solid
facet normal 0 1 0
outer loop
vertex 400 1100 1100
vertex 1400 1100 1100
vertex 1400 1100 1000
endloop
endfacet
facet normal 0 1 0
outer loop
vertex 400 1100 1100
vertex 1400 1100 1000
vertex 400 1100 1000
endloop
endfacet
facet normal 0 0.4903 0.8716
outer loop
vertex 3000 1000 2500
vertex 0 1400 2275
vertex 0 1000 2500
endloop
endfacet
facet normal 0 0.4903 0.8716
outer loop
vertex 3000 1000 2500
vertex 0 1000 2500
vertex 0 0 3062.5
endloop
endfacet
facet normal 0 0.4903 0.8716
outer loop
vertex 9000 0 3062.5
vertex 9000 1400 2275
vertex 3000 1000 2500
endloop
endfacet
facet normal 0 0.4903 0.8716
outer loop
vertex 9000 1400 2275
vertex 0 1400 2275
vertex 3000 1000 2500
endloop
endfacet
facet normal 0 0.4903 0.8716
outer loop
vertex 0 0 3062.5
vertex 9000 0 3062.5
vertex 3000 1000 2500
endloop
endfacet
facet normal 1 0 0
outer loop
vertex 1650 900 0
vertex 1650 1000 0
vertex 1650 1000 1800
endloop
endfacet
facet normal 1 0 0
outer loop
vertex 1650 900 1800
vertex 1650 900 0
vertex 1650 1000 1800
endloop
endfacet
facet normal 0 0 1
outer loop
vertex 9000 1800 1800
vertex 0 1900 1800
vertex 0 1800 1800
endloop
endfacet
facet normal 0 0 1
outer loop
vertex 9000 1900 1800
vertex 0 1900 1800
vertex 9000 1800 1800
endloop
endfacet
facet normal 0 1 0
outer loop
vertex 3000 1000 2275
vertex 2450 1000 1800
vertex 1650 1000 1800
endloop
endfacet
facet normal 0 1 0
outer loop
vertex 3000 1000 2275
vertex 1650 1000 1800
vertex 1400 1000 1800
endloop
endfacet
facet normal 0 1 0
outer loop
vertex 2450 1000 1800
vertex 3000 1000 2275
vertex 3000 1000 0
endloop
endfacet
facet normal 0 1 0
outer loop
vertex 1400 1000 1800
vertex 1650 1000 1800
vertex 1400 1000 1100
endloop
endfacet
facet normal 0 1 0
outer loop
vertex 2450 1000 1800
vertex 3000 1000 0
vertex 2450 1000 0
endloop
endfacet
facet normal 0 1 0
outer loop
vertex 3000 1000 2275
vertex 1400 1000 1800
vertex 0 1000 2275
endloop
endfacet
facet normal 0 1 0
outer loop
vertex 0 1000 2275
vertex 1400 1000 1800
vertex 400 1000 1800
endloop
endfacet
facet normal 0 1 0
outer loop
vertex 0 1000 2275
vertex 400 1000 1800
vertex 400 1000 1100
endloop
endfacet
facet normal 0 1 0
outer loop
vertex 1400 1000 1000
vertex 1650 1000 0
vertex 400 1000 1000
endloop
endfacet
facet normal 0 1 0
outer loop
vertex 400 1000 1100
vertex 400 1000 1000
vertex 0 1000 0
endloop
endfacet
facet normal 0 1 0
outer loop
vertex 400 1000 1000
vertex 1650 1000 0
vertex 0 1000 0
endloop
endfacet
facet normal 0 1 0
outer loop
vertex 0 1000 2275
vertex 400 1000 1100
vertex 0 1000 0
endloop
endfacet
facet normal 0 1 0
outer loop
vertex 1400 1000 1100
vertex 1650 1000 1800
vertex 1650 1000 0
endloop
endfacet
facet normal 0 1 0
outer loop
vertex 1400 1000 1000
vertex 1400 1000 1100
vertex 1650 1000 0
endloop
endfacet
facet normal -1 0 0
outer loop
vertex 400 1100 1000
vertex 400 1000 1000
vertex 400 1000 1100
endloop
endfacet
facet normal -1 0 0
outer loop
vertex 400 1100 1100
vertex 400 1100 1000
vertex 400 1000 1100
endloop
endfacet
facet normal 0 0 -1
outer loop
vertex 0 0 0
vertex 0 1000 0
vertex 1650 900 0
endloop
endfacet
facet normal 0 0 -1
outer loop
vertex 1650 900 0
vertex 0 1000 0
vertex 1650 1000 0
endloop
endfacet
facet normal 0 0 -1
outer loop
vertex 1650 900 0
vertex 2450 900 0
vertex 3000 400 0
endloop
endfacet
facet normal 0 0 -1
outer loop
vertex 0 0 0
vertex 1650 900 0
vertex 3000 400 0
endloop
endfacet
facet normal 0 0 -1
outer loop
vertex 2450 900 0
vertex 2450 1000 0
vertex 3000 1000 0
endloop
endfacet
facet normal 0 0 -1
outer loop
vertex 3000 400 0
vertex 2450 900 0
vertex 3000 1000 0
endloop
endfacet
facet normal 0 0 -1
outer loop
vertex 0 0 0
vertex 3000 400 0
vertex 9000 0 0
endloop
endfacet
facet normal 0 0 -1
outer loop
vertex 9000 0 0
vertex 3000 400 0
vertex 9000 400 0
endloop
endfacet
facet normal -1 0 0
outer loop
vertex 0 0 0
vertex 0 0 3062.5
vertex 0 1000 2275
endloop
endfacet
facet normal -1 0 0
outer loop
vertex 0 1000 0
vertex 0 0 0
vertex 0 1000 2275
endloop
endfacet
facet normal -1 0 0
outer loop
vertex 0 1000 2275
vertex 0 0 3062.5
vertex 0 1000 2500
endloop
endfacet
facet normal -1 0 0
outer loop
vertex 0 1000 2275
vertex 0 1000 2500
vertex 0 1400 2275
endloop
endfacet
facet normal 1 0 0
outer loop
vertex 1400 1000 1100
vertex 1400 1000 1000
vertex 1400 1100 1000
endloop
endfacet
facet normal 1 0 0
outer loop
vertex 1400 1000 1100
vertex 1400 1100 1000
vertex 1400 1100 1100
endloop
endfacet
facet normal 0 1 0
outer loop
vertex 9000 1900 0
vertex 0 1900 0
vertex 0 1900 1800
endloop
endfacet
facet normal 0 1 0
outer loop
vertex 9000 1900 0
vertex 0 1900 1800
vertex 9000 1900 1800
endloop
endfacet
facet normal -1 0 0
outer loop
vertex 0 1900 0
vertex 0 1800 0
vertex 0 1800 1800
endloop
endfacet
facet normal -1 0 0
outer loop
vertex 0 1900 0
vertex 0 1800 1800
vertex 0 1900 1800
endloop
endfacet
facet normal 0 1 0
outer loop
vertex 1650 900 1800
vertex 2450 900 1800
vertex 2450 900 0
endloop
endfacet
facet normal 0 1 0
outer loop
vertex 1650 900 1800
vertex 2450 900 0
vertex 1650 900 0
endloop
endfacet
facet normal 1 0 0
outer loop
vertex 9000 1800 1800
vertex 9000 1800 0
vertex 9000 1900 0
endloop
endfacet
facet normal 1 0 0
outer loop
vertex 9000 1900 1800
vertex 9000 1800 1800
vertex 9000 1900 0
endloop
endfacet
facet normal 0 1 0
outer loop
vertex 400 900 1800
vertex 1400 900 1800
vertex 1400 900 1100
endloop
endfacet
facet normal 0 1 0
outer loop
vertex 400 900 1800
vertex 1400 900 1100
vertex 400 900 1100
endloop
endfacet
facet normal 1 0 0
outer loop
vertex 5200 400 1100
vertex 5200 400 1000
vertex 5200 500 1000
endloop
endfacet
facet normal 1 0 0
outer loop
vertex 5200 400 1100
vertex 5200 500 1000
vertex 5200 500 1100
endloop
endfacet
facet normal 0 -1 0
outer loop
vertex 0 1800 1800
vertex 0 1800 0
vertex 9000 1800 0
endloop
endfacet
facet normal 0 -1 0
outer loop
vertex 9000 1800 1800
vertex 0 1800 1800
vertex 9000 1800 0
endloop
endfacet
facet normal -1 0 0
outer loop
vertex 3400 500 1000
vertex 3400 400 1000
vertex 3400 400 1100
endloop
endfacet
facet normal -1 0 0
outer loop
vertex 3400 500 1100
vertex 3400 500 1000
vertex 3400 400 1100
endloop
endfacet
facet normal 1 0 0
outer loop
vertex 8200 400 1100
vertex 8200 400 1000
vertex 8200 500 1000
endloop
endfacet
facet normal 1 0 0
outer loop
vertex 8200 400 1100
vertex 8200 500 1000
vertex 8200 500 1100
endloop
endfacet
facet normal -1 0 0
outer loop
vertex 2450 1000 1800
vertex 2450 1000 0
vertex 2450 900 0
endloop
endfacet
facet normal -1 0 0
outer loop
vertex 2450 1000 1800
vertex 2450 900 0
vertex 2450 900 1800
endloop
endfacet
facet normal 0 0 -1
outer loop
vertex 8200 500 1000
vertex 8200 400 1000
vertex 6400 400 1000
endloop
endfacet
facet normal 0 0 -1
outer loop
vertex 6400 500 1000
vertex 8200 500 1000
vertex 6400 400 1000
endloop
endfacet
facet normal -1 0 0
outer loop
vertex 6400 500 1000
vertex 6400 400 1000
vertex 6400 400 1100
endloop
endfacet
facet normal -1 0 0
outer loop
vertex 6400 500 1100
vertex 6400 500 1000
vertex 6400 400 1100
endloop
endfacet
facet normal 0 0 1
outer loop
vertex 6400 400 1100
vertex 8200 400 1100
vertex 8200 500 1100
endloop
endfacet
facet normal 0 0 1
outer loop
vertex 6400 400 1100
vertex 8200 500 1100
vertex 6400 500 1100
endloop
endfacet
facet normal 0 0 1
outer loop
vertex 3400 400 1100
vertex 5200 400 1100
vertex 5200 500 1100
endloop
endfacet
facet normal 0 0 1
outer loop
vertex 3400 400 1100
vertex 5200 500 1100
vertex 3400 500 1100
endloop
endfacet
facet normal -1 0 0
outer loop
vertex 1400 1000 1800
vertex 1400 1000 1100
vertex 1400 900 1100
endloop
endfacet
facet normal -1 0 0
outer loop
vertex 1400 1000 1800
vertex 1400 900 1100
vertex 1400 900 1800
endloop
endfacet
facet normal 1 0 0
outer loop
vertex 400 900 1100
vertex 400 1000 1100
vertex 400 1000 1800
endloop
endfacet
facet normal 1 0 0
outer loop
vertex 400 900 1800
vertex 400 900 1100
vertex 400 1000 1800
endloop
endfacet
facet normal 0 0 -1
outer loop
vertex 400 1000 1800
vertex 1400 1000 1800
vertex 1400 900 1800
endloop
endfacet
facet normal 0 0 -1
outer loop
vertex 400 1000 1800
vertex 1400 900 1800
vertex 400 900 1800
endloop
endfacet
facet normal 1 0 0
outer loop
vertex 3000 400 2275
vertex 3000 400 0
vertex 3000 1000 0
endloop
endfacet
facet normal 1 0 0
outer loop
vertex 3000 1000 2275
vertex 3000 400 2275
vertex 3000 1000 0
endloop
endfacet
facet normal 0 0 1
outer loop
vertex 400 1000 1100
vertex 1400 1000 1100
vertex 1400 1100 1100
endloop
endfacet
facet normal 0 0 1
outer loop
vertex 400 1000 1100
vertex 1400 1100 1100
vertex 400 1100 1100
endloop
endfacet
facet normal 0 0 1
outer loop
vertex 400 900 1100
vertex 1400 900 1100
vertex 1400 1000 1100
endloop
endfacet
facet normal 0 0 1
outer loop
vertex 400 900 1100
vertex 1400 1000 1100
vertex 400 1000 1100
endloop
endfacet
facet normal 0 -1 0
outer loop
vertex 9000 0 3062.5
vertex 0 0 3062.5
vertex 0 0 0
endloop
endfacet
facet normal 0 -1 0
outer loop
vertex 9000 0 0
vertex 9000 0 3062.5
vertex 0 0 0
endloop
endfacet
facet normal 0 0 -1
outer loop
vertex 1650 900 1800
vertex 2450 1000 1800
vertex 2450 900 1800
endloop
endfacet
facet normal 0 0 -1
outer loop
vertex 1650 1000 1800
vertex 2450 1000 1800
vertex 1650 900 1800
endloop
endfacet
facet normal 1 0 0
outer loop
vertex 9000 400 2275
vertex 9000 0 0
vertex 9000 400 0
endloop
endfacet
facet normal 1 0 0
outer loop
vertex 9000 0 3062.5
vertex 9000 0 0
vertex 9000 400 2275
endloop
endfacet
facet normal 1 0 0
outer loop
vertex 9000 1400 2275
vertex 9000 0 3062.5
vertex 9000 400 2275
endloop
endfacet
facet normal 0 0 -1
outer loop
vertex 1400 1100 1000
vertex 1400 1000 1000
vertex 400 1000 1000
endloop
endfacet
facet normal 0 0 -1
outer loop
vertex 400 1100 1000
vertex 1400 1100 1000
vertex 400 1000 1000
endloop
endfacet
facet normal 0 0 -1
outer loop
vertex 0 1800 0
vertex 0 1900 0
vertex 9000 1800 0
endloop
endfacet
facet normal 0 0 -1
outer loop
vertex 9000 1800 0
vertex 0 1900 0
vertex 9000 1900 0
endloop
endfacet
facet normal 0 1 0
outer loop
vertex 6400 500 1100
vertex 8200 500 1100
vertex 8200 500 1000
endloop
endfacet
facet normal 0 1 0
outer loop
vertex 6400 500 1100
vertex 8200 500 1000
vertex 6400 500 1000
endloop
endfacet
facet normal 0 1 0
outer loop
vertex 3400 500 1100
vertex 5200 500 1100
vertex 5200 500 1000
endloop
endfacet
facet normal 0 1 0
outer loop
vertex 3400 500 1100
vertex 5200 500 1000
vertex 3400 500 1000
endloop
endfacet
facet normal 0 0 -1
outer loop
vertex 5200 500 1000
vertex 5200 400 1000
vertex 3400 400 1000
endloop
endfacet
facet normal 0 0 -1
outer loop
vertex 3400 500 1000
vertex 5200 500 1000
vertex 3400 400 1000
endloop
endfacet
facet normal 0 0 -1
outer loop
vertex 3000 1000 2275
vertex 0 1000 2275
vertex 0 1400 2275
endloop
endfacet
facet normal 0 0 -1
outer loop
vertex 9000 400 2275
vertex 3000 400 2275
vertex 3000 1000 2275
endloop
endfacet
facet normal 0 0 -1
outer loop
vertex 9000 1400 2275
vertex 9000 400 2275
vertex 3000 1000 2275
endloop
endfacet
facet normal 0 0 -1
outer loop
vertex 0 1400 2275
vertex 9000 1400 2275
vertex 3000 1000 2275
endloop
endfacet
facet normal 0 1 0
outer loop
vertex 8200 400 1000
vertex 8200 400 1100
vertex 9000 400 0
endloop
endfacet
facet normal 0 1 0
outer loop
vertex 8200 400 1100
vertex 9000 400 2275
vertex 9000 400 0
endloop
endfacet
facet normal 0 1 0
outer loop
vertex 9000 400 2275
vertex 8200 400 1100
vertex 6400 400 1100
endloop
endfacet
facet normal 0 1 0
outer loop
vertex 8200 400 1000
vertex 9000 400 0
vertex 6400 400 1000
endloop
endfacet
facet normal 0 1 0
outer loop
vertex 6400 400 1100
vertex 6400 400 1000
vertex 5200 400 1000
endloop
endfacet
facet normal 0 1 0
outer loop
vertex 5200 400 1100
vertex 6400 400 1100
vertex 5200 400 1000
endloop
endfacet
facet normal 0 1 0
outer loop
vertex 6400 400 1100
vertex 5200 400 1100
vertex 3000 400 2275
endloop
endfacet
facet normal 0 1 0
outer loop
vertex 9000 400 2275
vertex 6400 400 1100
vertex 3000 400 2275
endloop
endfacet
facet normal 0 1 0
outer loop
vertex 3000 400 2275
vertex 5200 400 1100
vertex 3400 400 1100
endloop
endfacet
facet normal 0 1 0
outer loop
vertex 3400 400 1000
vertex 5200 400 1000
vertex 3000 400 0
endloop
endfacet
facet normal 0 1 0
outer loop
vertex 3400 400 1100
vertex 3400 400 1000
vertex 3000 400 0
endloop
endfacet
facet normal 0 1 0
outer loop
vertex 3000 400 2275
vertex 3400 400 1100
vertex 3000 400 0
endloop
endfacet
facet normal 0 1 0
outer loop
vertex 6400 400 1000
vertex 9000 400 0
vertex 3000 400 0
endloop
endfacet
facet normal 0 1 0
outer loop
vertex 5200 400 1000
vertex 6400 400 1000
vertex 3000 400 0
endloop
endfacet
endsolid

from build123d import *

# Parameters (mm, degrees)
F1_DEPTH  = 2500
F0_W      = 9000
F0_H      = 100
F2_DEPTH  = 1800
F3_W      = 1000
F3_H      = 100
F4_DEPTH  = 100
F5_W      = 1000
F5_H      = 700
F5_W_2    = 800
F5_H_2    = 1800
F6_DEPTH  = 100
F7_W      = 1800
F7_H      = 100
F8_DEPTH  = 100
F10_DEPTH = 9000


with BuildPart() as f1:
    # F0 (on Top) → F1 (new body)
    with BuildSketch(Plane.XY):
        Polygon((0, 1000), (0, 0), (9000, 0), (9000, 400), (3000, 400), (3000, 1000), align=None)
    extrude(amount=F1_DEPTH)

    # F3 (on face) → F4 (join)
    with BuildSketch(Plane(origin=(0, 1000, 0), x_dir=(-1, 0, 0), z_dir=(0, 1, 0))):
        with Locations((-900, 1050)):
            Rectangle(F3_W, F3_H)
    extrude(amount=F4_DEPTH)

    # F5 (on face) → F6 (cut)
    with BuildSketch(Plane(origin=(0, 1000, 0), x_dir=(-1, 0, 0), z_dir=(0, 1, 0))):
        with Locations((-900, 1450)):
            Rectangle(F5_W, F5_H)
        with Locations((-2050, 900)):
            Rectangle(F5_W_2, F5_H_2)
    extrude(amount=-F6_DEPTH, mode=Mode.SUBTRACT)

    # F7 (on face) → F8 (join)
    with BuildSketch(Plane(origin=(0, 400, 0), x_dir=(-1, 0, 0), z_dir=(0, 1, 0))):
        with Locations((-4300, 1050)):
            Rectangle(F7_W, F7_H)
        with Locations((-7300, 1050)):
            Rectangle(F7_W, F7_H)
    extrude(amount=F8_DEPTH)

    # F9 (on face) → F10 (join, through all)
    with BuildSketch(Plane.YZ.offset(9000)):
        Polygon((400, 2500), (400, 2275), (1400, 2275), (0, 3062.5), (0, 2500), align=None)
    extrude(amount=-F10_DEPTH)


with BuildPart() as f2:
    # F0 (on Top) → F2 (new body)
    with BuildSketch(Plane.XY):
        with Locations((4500, 1850)):
            Rectangle(F0_W, F0_H)
    extrude(amount=F2_DEPTH)


solid = Compound([f1.part, f2.part])
